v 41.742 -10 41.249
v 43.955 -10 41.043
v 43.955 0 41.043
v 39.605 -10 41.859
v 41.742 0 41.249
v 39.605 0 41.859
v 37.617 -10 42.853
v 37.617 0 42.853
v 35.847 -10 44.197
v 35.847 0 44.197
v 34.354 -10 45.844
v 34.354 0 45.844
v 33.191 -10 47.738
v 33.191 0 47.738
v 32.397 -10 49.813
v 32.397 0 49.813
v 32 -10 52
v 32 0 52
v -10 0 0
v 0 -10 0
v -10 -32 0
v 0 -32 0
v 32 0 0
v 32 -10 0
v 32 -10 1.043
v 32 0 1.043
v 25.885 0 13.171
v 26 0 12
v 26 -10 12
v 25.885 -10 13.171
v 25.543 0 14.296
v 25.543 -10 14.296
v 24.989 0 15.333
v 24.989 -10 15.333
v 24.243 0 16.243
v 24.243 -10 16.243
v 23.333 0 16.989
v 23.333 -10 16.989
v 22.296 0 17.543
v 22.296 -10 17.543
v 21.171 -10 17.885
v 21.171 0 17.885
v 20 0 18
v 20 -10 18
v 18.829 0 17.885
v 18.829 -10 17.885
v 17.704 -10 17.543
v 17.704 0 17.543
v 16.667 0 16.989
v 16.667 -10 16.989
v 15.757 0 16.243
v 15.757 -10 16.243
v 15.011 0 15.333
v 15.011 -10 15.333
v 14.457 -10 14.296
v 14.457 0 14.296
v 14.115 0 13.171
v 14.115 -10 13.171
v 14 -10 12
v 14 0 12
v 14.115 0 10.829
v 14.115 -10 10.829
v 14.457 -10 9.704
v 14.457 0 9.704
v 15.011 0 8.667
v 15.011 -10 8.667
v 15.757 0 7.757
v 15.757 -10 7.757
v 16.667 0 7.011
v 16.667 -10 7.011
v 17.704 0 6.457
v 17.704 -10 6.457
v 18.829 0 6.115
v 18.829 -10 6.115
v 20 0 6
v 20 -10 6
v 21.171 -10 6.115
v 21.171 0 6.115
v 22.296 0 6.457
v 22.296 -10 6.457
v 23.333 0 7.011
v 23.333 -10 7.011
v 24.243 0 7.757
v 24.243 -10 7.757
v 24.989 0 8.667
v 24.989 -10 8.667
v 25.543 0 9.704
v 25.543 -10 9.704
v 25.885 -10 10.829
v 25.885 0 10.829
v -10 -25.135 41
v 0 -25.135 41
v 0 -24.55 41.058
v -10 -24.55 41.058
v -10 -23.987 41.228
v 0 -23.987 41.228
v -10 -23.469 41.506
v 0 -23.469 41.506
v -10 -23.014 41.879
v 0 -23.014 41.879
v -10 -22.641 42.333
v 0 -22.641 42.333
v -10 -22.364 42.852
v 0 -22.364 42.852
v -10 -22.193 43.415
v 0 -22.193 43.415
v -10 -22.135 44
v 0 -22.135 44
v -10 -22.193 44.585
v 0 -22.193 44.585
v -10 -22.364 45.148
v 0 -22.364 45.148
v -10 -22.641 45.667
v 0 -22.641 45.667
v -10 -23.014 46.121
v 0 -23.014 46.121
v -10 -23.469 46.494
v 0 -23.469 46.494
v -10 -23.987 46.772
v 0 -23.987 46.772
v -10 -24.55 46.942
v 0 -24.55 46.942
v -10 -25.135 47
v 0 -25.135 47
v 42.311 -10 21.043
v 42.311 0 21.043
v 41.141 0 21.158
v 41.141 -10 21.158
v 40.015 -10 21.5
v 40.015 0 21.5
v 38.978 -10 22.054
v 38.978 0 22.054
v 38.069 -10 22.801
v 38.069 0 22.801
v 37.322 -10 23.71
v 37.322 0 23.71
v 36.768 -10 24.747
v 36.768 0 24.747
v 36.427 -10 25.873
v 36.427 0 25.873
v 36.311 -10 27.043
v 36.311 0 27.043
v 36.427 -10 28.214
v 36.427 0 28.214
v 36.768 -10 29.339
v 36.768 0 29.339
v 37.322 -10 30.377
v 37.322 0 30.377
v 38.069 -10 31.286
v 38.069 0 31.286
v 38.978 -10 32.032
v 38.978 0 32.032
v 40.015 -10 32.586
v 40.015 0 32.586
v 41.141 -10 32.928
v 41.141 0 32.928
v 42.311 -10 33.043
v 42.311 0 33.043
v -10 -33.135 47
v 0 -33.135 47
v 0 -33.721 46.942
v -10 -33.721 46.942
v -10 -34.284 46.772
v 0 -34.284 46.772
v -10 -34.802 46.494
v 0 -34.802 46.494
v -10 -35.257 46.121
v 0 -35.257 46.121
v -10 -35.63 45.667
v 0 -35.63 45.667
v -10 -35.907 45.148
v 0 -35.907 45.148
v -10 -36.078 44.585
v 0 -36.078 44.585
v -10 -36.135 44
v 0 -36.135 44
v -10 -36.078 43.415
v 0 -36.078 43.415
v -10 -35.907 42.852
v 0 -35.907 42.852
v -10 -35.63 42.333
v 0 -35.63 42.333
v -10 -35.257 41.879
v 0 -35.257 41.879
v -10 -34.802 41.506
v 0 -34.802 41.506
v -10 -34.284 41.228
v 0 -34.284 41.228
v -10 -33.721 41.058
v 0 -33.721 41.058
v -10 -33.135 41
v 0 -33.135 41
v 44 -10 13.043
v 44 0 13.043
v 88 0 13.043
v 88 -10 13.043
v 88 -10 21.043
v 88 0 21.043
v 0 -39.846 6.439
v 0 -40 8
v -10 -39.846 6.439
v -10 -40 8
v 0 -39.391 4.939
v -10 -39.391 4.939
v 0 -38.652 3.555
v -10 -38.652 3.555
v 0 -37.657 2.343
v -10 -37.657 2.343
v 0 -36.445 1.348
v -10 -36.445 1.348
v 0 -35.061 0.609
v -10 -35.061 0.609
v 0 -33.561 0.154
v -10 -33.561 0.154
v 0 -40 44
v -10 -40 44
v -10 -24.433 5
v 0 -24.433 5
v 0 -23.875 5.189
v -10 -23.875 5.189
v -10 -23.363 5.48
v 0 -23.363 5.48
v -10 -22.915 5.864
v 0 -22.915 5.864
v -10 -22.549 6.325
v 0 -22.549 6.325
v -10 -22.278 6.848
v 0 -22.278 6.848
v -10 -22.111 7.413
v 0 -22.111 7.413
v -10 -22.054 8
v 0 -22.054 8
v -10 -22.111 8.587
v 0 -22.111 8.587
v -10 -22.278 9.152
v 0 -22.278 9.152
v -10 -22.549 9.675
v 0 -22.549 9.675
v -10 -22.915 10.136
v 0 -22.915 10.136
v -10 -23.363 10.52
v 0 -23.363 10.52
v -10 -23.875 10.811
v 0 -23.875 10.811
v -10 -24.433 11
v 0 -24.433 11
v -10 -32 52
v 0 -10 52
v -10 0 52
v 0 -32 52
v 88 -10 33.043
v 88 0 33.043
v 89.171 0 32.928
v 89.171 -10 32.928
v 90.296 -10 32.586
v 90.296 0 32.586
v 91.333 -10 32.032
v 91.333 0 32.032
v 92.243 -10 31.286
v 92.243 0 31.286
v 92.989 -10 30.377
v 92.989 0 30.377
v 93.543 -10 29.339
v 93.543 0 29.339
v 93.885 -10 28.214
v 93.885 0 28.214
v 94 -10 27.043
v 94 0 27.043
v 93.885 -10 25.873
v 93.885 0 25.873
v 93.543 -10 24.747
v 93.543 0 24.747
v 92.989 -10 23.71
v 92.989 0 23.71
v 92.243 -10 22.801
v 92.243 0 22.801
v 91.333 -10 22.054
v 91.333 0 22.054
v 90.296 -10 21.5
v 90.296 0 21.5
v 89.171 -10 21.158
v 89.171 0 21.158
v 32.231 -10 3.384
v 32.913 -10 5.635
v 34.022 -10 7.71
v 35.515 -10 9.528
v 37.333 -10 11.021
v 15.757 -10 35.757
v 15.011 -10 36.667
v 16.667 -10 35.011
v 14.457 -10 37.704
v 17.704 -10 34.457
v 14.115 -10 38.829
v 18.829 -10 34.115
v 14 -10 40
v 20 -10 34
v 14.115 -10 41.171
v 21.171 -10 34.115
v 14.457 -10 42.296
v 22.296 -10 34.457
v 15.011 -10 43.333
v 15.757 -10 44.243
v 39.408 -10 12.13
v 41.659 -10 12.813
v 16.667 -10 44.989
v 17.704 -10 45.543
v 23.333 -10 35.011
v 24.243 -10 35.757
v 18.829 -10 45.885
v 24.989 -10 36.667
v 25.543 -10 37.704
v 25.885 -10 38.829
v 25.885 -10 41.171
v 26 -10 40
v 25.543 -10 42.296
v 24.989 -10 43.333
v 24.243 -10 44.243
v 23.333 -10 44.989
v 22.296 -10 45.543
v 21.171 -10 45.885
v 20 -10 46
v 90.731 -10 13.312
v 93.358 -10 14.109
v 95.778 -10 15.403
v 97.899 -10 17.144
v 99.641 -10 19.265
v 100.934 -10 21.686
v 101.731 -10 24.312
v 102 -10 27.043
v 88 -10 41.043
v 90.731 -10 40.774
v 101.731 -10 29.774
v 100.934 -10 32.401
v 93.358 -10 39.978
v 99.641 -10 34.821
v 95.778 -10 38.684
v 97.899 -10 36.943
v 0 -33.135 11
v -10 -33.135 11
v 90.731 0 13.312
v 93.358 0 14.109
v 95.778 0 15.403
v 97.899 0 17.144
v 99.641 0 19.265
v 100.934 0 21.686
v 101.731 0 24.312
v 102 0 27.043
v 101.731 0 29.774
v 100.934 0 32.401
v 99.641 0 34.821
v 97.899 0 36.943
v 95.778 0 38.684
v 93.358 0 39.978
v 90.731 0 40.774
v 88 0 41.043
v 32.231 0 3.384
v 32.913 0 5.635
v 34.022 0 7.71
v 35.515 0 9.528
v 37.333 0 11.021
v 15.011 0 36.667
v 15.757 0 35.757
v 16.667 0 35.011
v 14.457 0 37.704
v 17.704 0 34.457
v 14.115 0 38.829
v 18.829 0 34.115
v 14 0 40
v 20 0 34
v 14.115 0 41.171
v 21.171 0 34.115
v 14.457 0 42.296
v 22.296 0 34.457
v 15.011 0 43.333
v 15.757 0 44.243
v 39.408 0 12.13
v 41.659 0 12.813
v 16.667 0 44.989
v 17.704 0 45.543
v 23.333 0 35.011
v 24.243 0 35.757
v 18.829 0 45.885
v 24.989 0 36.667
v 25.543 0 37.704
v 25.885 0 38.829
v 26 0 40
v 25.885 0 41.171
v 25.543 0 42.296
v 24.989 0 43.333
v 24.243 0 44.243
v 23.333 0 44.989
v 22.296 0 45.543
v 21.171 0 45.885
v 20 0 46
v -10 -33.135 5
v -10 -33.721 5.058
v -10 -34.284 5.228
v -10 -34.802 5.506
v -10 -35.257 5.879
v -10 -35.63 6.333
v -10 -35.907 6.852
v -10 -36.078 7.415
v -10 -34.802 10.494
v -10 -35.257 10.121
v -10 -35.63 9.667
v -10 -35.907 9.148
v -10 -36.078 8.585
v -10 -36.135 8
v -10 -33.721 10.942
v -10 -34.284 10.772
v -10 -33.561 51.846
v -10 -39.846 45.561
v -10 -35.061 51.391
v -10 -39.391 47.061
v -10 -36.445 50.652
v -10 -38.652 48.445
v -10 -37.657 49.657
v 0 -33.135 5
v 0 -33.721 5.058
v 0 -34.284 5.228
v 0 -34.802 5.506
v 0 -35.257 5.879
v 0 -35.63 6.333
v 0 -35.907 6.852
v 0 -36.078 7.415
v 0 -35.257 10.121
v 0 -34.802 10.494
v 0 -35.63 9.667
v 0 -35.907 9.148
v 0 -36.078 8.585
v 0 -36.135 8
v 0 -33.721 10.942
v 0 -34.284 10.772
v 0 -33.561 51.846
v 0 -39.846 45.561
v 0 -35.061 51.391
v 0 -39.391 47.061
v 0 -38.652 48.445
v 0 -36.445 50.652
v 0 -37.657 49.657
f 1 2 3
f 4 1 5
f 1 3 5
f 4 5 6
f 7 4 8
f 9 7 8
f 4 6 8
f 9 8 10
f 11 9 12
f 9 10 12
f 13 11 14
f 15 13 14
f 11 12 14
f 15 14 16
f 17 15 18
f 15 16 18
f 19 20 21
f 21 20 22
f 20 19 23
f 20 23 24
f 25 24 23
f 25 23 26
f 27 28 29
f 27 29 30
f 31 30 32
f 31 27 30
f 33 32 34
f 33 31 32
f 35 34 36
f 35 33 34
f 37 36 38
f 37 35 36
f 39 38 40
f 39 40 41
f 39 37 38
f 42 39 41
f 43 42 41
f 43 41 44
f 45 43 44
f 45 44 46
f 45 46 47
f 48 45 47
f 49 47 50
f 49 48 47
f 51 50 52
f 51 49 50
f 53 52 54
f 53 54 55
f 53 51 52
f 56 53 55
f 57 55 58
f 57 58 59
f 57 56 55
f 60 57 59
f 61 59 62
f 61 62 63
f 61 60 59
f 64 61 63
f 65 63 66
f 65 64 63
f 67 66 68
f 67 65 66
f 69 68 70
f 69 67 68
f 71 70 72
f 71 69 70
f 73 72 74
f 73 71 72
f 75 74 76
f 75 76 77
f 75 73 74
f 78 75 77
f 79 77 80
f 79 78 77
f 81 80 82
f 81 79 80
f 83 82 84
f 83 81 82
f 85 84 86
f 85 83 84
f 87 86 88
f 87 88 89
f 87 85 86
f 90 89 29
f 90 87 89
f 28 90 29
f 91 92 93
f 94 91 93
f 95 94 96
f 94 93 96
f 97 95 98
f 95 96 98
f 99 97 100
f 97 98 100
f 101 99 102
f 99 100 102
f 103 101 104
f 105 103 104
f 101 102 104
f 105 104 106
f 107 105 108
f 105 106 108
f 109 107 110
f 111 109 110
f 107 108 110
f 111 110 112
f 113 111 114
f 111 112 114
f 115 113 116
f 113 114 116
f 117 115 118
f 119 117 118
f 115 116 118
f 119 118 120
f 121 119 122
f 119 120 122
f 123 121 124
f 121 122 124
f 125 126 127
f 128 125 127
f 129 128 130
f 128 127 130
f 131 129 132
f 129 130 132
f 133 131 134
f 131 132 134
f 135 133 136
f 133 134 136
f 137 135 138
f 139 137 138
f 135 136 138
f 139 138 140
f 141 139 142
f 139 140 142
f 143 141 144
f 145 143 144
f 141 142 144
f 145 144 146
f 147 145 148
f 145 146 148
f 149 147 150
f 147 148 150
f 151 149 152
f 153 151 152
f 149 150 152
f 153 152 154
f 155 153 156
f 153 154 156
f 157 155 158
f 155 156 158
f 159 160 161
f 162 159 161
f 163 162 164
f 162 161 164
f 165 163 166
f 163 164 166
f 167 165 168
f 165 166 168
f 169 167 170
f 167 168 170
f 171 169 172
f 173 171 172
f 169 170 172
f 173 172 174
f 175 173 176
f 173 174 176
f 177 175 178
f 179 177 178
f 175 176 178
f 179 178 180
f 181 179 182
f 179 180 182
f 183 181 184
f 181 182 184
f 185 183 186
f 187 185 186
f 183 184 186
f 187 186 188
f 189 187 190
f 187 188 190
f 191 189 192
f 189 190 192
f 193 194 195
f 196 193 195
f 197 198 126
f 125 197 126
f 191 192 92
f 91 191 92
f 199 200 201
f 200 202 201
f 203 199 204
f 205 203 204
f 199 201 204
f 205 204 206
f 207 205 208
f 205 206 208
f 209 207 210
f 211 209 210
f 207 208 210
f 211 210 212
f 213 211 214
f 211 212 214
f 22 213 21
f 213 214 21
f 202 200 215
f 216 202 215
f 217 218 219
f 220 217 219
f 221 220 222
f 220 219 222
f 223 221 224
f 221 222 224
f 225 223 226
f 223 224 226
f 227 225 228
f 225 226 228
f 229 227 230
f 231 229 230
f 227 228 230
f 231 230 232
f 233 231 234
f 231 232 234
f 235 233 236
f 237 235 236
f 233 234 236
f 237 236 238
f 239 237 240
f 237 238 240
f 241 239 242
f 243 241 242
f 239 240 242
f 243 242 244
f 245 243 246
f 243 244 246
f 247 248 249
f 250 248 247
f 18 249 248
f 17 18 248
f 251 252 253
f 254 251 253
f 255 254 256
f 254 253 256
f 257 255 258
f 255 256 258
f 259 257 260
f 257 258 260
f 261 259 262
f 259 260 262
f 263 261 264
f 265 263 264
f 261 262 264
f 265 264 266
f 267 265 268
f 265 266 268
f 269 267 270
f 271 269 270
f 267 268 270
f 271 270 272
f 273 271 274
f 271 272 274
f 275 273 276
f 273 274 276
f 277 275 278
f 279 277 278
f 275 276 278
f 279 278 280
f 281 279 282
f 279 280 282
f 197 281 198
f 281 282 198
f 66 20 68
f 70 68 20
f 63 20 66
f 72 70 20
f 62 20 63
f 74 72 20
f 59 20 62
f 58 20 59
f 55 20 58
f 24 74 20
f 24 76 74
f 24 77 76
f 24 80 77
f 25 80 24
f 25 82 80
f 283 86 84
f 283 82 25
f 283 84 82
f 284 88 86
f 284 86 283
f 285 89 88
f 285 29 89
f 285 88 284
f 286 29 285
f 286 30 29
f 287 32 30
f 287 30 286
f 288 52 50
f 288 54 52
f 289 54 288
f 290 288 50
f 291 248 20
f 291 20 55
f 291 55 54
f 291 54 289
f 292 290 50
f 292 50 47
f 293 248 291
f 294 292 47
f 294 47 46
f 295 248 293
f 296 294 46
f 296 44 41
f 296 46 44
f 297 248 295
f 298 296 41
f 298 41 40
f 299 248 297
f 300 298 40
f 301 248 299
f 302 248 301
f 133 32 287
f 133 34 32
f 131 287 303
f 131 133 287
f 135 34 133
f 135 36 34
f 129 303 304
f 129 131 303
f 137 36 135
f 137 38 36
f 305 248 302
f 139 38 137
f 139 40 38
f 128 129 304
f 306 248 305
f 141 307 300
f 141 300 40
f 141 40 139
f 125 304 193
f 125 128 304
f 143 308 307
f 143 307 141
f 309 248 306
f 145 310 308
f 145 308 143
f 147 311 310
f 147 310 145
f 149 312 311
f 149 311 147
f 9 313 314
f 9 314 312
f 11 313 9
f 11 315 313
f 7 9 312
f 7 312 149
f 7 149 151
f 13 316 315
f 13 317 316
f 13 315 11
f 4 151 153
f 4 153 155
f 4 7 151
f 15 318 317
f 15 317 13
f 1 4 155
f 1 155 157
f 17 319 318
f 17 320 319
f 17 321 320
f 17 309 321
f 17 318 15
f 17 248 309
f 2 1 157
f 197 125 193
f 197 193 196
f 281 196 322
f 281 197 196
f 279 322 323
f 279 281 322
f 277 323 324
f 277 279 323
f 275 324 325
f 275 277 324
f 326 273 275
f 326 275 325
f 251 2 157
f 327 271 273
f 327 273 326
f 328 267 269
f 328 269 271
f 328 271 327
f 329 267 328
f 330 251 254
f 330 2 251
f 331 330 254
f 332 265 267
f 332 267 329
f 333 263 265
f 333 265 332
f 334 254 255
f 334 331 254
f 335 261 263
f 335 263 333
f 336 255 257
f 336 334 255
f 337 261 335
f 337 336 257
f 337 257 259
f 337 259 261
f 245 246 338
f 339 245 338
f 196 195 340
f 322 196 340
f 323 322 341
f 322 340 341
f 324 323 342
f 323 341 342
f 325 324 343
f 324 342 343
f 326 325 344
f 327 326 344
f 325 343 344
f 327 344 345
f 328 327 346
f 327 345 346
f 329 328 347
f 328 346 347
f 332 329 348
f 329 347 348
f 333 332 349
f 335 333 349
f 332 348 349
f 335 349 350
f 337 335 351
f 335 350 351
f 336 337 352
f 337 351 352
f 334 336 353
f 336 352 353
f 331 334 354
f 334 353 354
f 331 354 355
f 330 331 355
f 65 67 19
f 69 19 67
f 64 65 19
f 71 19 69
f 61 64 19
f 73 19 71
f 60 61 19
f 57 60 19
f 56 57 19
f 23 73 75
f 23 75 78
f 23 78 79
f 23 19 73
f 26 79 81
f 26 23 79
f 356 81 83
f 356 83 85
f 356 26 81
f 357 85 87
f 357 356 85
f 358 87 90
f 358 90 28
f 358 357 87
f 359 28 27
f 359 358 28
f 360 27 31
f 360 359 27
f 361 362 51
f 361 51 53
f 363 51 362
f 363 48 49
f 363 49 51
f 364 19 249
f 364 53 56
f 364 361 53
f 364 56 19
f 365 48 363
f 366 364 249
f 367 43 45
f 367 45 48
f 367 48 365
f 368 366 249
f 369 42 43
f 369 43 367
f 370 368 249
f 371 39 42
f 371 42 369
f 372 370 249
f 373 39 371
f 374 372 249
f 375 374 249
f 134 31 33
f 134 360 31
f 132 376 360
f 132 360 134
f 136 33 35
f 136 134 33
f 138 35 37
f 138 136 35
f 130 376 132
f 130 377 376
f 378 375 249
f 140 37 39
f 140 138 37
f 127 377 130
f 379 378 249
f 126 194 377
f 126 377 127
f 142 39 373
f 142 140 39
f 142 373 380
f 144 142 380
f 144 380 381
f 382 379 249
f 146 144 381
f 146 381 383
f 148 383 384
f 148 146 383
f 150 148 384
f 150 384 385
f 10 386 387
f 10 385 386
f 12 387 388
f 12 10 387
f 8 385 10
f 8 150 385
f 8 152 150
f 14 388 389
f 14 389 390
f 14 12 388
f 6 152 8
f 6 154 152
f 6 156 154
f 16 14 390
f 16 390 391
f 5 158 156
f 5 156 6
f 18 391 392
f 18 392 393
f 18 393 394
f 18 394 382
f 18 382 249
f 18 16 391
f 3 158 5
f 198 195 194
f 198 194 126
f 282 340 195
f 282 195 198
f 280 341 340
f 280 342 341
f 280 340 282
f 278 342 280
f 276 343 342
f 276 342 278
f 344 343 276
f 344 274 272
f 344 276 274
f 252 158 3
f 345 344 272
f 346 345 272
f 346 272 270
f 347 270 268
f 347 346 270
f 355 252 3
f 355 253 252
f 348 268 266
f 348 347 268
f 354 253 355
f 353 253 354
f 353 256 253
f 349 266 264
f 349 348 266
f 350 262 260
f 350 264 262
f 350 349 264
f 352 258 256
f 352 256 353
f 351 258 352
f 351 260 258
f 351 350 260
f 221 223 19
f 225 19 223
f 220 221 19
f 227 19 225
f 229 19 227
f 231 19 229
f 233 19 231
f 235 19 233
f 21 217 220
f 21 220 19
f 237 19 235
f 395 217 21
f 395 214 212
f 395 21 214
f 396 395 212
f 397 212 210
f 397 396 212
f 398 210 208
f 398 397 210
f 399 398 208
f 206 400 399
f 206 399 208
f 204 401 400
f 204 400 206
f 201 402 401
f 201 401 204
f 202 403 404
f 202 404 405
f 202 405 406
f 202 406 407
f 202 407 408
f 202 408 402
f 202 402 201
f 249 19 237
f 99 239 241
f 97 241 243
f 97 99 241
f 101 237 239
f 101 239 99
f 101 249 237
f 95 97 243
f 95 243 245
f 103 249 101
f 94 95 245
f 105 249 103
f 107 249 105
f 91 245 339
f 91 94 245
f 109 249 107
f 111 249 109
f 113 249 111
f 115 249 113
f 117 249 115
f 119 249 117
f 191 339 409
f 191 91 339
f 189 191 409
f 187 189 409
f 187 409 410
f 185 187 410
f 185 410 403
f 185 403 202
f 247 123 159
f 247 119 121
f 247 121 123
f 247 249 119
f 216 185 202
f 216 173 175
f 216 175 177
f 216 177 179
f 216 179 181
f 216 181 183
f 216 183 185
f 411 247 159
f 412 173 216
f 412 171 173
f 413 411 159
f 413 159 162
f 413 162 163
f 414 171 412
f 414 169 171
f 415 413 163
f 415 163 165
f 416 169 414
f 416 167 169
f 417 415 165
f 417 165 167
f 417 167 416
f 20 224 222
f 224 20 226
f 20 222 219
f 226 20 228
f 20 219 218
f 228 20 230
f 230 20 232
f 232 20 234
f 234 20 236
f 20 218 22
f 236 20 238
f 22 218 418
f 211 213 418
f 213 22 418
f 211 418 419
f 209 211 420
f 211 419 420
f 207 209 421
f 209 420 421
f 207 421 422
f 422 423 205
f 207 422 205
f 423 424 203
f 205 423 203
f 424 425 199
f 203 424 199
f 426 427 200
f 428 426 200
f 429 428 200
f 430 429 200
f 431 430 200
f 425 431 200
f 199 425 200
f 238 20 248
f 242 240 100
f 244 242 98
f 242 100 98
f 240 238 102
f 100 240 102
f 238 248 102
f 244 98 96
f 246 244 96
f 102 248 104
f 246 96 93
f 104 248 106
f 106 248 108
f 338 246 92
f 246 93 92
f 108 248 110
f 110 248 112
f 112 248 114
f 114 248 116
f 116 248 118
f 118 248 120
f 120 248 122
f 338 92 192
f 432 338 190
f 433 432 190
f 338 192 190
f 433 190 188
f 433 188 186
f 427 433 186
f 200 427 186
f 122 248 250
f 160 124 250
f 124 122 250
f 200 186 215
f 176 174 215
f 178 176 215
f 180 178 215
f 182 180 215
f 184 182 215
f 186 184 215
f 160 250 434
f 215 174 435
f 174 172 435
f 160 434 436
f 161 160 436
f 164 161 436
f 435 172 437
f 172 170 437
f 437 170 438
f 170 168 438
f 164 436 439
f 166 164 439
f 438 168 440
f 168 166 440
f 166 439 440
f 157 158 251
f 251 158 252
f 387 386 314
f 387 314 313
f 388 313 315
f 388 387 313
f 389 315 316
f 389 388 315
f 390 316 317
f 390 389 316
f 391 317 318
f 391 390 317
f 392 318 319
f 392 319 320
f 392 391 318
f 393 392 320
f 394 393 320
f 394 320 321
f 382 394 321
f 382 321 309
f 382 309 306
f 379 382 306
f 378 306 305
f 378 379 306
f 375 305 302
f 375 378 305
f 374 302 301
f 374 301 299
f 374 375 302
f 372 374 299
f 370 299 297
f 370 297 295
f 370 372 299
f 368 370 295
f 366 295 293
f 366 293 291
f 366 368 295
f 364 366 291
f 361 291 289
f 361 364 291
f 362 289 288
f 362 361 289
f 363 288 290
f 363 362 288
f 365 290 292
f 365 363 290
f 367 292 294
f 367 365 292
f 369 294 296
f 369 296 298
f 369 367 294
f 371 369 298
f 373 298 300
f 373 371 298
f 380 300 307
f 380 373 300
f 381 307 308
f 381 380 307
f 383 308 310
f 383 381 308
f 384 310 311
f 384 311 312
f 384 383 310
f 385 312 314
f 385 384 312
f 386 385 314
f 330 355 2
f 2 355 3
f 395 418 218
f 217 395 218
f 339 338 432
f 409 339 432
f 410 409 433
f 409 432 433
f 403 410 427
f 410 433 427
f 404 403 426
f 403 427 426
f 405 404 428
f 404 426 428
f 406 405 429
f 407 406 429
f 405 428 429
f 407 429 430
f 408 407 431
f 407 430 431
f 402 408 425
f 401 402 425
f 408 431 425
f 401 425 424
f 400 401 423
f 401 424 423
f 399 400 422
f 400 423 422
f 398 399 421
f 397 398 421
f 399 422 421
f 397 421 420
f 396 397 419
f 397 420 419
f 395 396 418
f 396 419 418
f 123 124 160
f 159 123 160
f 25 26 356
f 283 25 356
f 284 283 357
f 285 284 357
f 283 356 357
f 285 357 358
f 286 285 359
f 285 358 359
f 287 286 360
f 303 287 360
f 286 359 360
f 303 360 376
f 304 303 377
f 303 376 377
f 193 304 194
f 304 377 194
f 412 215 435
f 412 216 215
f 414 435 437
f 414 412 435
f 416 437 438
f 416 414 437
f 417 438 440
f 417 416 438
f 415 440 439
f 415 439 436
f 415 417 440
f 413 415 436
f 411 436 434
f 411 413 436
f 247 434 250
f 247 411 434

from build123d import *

# Parameters (mm, degrees)
F0_R        = 6
F1_DEPTH    = 10
F2_T1_DEPTH = 10
F3_W        = 40
F3_H        = 52
F4_DEPTH    = 10
F5_R        = 8


# Not quite as in the source:
# - a fillet or chamfer that OpenCascade refuses, or shapes differently, is made with other operations: its cross-section is extruded or revolved along the edge and cut away or added


with BuildPart() as f1:
    # F0 (on Front) → F1 (new body)
    with BuildSketch(Plane.XZ):
        with BuildLine():
            Line((32, 52), (0, 52))
            Line((0, 52), (0, 0))
            Line((0, 0), (32, 0))
            Line((32, 0), (32, 13.0432075486))
            Line((32, 13.0432075486), (88, 13.0432075486))
            ThreePointArc((88, 13.0432075486), (102, 27.0432075486), (88, 41.0432075486))
            Line((88, 41.0432075486), (32, 41.0432075486))
            Line((32, 41.0432075486), (32, 52))
        make_face()
        with Locations((20, 12)):
            Circle(F0_R, mode=Mode.SUBTRACT)
        with Locations((20, 40)):
            Circle(F0_R, mode=Mode.SUBTRACT)
        with BuildLine():
            ThreePointArc((88, 33.0432075486), (94, 27.0432075486), (88, 21.0432075486))
            Line((88, 21.0432075486), (42.3112809658, 21.0432075486))
            ThreePointArc((42.3112809658, 21.0432075486), (36.3112809658, 27.0432075486), (42.3112809658, 33.0432075486))
            Line((42.3112809658, 33.0432075486), (88, 33.0432075486))
        make_face(mode=Mode.SUBTRACT)
    extrude(amount=F1_DEPTH)

    # F2: fillet of radius 12 on 2 edges, made by hand

    # F2_s2 → F2_t1 (join)
    with BuildSketch(Plane.XZ):
        with BuildLine():
            ThreePointArc((43.9545689178, 41.0432075486), (35.8465016568, 44.1967819828), (32, 52))
            Line((32, 52), (32, 41.0432075486))
            Line((32, 41.0432075486), (43.9545689178, 41.0432075486))
        make_face()
        with BuildLine():
            ThreePointArc((32, 1.0432075486), (35.5147186258, 9.5284889228), (44, 13.0432075486))
            Line((44, 13.0432075486), (32, 13.0432075486))
            Line((32, 13.0432075486), (32, 1.0432075486))
        make_face()
    extrude(amount=F2_T1_DEPTH)

    # F3 (on face) → F4 (join)
    with BuildSketch(Plane(origin=(0, 0, 0), x_dir=(0, -1, 0), z_dir=(-1, 0, 0))):
        with Locations((20, 26)):
            Rectangle(F3_W, F3_H)
        with BuildLine():
            ThreePointArc((33.1354735655, 11), (36.1354735655, 8), (33.1354735655, 5))
            Line((33.1354735655, 5), (24.4329432571, 5))
            ThreePointArc((24.4329432571, 5), (22.054313259, 8), (24.4329432571, 11))
            Line((24.4329432571, 11), (33.1354735655, 11))
        make_face(mode=Mode.SUBTRACT)
        with BuildLine():
            ThreePointArc((33.1354735655, 47), (36.1354735655, 44), (33.1354735655, 41))
            Line((33.1354735655, 41), (25.1354735655, 41))
            ThreePointArc((25.1354735655, 41), (22.1354735655, 44), (25.1354735655, 47))
            Line((25.1354735655, 47), (33.1354735655, 47))
        make_face(mode=Mode.SUBTRACT)
    extrude(amount=F4_DEPTH)

    # F5
    f5_edges = [f1.edges().sort_by_distance(p)[0] for p in [
        (-5, -40, 52),
        (-5, -40, 0),
    ]]
    fillet(f5_edges, radius=F5_R)


solid = f1.part
